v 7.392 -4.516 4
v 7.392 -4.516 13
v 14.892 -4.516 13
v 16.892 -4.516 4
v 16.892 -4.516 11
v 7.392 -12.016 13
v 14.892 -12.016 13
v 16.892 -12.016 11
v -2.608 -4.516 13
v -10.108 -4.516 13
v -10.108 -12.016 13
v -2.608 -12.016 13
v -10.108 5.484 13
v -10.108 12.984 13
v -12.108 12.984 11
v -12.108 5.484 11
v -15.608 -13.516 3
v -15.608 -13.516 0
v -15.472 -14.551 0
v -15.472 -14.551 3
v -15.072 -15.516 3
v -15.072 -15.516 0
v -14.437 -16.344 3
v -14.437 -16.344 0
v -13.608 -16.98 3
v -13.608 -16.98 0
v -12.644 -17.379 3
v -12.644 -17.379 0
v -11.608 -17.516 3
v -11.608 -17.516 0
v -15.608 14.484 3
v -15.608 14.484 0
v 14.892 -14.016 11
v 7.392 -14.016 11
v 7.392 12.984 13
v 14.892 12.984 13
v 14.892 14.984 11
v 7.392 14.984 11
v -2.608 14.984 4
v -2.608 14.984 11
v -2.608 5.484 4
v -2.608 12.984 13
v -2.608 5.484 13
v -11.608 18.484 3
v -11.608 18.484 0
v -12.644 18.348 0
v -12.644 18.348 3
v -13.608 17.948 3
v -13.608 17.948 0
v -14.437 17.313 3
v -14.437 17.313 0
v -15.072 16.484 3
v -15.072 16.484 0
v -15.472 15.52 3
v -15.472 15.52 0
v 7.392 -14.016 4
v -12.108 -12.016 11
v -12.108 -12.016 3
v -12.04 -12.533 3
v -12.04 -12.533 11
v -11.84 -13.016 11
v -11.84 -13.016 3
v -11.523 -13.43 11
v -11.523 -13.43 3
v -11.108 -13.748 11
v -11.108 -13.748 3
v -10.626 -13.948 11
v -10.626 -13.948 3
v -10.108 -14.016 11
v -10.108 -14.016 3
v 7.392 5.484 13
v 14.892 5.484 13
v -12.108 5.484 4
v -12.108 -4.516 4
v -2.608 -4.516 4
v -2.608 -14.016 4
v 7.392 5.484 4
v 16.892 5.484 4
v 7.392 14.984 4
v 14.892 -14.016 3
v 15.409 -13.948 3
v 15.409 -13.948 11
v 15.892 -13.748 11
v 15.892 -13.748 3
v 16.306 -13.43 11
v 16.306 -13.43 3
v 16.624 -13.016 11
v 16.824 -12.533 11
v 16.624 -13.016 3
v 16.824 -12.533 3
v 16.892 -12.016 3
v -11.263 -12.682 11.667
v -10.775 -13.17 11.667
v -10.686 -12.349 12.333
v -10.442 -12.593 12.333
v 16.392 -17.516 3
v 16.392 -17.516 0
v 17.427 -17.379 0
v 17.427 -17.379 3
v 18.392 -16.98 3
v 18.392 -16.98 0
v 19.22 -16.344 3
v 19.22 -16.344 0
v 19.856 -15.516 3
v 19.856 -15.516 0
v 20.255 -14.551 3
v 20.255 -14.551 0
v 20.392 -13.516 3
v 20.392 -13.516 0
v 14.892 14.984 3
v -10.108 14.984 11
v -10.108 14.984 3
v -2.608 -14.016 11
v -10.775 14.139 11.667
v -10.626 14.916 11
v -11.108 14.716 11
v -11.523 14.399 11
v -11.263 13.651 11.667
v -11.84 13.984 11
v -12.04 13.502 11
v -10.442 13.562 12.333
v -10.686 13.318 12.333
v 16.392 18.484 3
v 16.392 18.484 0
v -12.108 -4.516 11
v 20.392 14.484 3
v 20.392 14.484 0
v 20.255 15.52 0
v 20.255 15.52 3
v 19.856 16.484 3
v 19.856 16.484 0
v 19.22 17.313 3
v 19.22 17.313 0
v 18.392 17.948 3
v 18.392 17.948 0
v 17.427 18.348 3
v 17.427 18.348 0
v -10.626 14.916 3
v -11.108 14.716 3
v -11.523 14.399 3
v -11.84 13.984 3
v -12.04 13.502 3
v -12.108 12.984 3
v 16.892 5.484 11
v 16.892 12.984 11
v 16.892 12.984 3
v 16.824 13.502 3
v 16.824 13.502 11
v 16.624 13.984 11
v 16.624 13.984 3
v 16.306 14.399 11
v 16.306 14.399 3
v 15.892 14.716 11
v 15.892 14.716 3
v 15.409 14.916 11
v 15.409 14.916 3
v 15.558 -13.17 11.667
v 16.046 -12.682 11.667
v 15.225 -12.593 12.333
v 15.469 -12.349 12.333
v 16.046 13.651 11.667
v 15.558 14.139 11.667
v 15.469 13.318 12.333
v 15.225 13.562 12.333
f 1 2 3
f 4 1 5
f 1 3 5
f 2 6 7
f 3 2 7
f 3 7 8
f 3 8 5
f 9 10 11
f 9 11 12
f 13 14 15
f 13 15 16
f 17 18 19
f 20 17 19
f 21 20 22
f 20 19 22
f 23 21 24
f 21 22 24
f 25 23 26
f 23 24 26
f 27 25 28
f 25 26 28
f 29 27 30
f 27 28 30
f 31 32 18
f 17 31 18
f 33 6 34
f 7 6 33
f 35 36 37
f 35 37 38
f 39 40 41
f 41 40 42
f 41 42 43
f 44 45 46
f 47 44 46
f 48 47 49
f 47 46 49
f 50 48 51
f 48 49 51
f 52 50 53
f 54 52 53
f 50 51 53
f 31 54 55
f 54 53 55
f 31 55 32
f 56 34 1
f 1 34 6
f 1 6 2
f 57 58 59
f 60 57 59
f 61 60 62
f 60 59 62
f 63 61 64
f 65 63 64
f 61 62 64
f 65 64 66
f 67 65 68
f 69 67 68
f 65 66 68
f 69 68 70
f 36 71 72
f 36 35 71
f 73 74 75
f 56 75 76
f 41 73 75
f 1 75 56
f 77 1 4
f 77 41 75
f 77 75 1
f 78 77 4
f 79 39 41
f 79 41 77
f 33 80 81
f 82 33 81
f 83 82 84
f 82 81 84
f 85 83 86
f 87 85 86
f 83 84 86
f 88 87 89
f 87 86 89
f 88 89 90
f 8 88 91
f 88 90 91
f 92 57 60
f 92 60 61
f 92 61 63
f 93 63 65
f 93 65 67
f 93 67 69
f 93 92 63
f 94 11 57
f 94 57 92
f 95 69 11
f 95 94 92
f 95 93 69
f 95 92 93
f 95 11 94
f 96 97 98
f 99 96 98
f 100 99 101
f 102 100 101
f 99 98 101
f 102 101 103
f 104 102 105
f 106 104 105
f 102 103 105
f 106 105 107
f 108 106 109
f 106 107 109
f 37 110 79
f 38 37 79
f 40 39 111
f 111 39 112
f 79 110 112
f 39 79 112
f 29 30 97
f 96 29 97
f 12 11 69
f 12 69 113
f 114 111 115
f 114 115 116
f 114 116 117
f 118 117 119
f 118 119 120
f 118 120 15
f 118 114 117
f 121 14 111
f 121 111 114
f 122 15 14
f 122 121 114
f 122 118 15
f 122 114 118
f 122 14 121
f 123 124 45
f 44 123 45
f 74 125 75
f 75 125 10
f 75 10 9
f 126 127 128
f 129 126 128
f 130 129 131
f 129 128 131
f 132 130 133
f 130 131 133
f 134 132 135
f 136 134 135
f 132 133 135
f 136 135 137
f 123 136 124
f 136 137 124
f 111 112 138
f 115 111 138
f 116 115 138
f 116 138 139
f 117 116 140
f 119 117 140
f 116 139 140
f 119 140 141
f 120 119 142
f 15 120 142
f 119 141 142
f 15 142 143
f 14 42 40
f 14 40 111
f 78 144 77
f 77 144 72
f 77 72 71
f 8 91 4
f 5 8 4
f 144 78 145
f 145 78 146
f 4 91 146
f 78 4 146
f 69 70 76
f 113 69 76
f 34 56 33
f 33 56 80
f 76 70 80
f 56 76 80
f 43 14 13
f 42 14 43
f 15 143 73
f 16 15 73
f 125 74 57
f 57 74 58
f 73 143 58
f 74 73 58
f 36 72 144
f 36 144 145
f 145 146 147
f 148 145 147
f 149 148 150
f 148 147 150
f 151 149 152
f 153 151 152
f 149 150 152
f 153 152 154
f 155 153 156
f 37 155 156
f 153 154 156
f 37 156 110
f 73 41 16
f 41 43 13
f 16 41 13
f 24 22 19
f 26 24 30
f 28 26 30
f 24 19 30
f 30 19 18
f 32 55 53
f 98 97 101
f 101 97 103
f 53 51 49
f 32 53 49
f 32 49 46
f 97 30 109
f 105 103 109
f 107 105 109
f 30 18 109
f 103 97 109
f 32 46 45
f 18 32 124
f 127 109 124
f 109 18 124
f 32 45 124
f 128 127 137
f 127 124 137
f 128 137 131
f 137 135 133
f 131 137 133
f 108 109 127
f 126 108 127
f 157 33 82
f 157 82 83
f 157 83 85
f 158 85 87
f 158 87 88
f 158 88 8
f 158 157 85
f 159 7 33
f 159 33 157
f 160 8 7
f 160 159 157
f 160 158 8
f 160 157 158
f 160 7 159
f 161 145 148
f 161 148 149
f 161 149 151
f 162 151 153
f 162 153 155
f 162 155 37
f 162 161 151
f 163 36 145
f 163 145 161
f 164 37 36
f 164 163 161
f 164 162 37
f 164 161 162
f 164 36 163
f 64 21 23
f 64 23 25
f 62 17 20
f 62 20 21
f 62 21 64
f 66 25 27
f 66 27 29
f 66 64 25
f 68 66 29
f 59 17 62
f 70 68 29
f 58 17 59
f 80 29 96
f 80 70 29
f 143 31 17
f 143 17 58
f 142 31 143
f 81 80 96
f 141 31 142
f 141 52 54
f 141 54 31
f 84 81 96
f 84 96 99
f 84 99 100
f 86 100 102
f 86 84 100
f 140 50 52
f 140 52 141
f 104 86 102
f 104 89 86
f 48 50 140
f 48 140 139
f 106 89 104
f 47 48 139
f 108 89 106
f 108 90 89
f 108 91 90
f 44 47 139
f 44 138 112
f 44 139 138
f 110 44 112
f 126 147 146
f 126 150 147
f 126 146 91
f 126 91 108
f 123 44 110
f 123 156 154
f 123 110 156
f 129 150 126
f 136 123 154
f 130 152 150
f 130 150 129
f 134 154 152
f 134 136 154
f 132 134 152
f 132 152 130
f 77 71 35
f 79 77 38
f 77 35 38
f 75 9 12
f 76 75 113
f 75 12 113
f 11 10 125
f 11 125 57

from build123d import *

# Parameters (mm, degrees)
F1_DEPTH = 3
F3_DEPTH = 10
F5_DEPTH = 9
F6_SIZE  = 1.99999


# Not quite as in the source:
# - a fillet or chamfer is up to 0.001 mm smaller than in the source, because OpenCascade refuses the exact size


with BuildPart() as f1:
    # F0 (on Top) → F1 (new body)
    with BuildSketch(Plane.XY):
        with BuildLine():
            Line((16.3916659281, 18.4843443355), (-11.6083340719, 18.4843443355))
            ThreePointArc((-11.6083340719, 18.4843443355), (-14.4367611967, 17.3127714603), (-15.6083340719, 14.4843443355))
            Line((-15.6083340719, 14.4843443355), (-15.6083340719, -13.5156556645))
            ThreePointArc((-15.6083340719, -13.5156556645), (-14.4367611967, -16.3440827892), (-11.6083340719, -17.5156556645))
            Line((-11.6083340719, -17.5156556645), (16.3916659281, -17.5156556645))
            ThreePointArc((16.3916659281, -17.5156556645), (19.2200930528, -16.3440827892), (20.3916659281, -13.5156556645))
            Line((20.3916659281, -13.5156556645), (20.3916659281, 14.4843443355))
            ThreePointArc((20.3916659281, 14.4843443355), (19.2200930528, 17.3127714603), (16.3916659281, 18.4843443355))
        make_face()
    extrude(amount=F1_DEPTH)

    # F2 (on face) → F3 (join)
    with BuildSketch(Plane.XY.offset(3)):
        with BuildLine():
            Line((14.8916659281, 14.9843443355), (-10.1083340719, 14.9843443355))
            ThreePointArc((-10.1083340719, 14.9843443355), (-11.5225476343, 14.3985578979), (-12.1083340719, 12.9843443355))
            Line((-12.1083340719, 12.9843443355), (-12.1083340719, -12.0156556645))
            ThreePointArc((-12.1083340719, -12.0156556645), (-11.5225476343, -13.4298692268), (-10.1083340719, -14.0156556645))
            Line((-10.1083340719, -14.0156556645), (14.8916659281, -14.0156556645))
            ThreePointArc((14.8916659281, -14.0156556645), (16.3058794904, -13.4298692268), (16.8916659281, -12.0156556645))
            Line((16.8916659281, -12.0156556645), (16.8916659281, 12.9843443355))
            ThreePointArc((16.8916659281, 12.9843443355), (16.3058794904, 14.3985578979), (14.8916659281, 14.9843443355))
        make_face()
    extrude(amount=F3_DEPTH)

    # F4 (on face) → F5 (cut)
    with BuildSketch(Plane.XY.offset(13)):
        Polygon((7.3916660622, 14.9843443355), (-2.6083340719, 14.9843443355), (-2.6083340719, 5.4843444377), (-12.1083340719, 5.4843444377), (-12.1083340719, -4.5156556645), (-2.6083340719, -4.5156556645), (-2.6083340719, -14.0156556645), (7.3916660622, -14.0156556645), (7.3916660622, -4.5156556645), (16.8916659281, -4.5156556645), (16.8916659281, 5.4843444377), (7.3916660622, 5.4843444377), align=None)
    extrude(amount=-F5_DEPTH, mode=Mode.SUBTRACT)

    # F6 (size 2 in the source; OpenCascade refuses exactly that, so slightly less here)
    f6_edges = [f1.edges().sort_by_distance(p)[0] for p in [
        (11.141666, -14.015656, 13),
        (-6.358334, -14.015656, 13),
        (16.891666, 9.234344, 13),
        (-12.108334, 9.234344, 13),
    ]]
    chamfer(f6_edges, length=F6_SIZE)


solid = f1.part
